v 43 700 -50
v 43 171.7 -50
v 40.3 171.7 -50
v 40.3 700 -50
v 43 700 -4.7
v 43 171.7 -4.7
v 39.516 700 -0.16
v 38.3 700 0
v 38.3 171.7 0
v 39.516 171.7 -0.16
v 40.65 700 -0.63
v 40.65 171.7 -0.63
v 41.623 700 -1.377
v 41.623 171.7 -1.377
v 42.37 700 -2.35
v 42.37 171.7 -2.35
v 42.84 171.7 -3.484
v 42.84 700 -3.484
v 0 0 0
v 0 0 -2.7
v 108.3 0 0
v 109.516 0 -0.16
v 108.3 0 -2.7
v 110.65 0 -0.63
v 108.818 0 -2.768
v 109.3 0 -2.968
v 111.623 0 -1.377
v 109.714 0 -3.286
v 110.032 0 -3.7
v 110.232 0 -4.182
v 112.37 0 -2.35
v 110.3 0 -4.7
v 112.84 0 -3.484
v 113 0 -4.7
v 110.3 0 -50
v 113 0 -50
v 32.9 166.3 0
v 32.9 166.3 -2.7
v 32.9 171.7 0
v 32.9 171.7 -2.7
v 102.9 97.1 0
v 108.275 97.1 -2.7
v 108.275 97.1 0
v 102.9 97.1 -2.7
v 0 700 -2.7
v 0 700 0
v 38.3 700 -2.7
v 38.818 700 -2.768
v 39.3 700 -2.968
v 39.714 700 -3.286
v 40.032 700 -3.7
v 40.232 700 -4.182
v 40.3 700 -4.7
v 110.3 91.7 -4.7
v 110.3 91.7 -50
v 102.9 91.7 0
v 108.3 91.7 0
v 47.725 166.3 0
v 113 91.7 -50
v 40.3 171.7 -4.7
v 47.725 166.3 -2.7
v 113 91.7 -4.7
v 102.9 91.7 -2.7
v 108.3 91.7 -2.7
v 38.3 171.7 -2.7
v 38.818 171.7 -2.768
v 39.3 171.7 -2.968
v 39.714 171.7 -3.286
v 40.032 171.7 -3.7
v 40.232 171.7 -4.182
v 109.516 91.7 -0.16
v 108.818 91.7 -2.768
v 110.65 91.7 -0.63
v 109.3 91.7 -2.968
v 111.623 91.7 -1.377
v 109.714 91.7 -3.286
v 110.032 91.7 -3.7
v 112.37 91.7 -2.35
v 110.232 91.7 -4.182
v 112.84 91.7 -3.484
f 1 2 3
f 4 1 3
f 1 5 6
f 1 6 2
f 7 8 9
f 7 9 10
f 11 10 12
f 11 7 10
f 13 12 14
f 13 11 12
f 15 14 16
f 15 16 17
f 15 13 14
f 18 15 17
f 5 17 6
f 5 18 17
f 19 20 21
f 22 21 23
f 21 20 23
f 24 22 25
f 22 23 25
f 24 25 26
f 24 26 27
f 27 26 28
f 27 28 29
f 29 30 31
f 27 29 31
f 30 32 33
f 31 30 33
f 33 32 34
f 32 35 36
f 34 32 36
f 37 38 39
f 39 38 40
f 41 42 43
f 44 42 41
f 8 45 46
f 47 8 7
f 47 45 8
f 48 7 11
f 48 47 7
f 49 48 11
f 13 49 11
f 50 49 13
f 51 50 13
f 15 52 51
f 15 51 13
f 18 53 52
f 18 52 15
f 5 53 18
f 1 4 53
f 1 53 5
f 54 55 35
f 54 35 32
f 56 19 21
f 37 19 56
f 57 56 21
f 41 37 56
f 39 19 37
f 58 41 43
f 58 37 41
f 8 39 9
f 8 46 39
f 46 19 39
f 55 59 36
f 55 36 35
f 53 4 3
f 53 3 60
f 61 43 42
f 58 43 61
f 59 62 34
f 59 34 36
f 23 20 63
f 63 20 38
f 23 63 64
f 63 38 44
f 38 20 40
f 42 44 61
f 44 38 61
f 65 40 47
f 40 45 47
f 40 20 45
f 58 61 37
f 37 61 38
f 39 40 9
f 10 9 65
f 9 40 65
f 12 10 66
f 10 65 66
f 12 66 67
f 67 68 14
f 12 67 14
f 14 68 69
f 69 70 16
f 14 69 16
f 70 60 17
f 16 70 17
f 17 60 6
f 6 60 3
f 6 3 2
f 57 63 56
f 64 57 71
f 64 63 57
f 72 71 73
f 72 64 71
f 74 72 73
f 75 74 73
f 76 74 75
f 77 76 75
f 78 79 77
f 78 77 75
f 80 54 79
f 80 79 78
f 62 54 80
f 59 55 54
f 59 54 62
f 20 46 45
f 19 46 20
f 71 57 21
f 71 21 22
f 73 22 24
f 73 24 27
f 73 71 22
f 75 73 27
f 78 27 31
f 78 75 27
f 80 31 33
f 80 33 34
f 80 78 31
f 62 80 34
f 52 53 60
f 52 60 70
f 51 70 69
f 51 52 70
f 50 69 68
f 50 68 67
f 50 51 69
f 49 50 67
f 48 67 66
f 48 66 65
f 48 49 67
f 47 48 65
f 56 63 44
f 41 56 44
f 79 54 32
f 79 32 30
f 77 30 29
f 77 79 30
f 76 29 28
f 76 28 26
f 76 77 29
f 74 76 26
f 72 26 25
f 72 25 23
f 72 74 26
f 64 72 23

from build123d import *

# Parameters (mm, degrees)
BASE_FLANGE1_DEPTH              = 2.7
EDGE_FLANGE1_STRIP_W            = 14.8
EDGE_FLANGE1_STRIP_H            = 2.7
EDGE_FLANGE1_STRIP_CUT_DEPTH    = 91.7
EDGE_FLANGE1_RELIEF_W           = 20.2
EDGE_FLANGE1_RELIEF_H           = 5.4
EDGE_FLANGE1_RELIEF_CUT_DEPTH   = 2.7
EDGE_FLANGE1_STRIP_2_W          = 14.8
EDGE_FLANGE1_STRIP_2_H          = 2.7
EDGE_FLANGE1_STRIP_CUT_2_DEPTH  = 528.3
EDGE_FLANGE1_RELIEF_2_W         = 20.2
EDGE_FLANGE1_RELIEF_2_H         = 5.4
EDGE_FLANGE1_RELIEF_CUT_2_DEPTH = 2.7
EDGE_FLANGE1_DEPTH              = 91.7
EDGE_FLANGE1_BEND_DEPTH         = 528.3


# Sheet-metal steps are written as plain solids
with BuildPart() as part:
    # Sketch1 → Base-Flange1 (new body)
    with BuildSketch(Plane.XY):
        Polygon((43, 700), (0, 700), (0, 0), (113, 0), (113, 91.7), (43, 171.7), align=None)
    extrude(amount=-BASE_FLANGE1_DEPTH)

    # Edge-Flange1 strip (across the edge) → Edge-Flange1 strip cut (cut)
    with BuildSketch(Plane(origin=(113, 91.7, -2.7), x_dir=(-1, 0, 0), z_dir=(0, -1, 0))):
        with Locations((-2.7, -1.35)):
            Rectangle(EDGE_FLANGE1_STRIP_W, EDGE_FLANGE1_STRIP_H)
    extrude(amount=EDGE_FLANGE1_STRIP_CUT_DEPTH, mode=Mode.SUBTRACT)

    # Edge-Flange1 relief (on the sheet) → Edge-Flange1 relief cut (cut)
    with BuildSketch(Plane(origin=(108.3, 91.7, -2.7), x_dir=(-1, 0, 0), z_dir=(0, 0, -1))):
        with Locations((-4.7, 2.7)):
            Rectangle(EDGE_FLANGE1_RELIEF_W, EDGE_FLANGE1_RELIEF_H)
    extrude(amount=-EDGE_FLANGE1_RELIEF_CUT_DEPTH, mode=Mode.SUBTRACT)

    # Edge-Flange1 strip 2 (across the edge) → Edge-Flange1 strip cut 2 (cut)
    with BuildSketch(Plane(origin=(43, 700, -2.7), x_dir=(-1, 0, 0), z_dir=(0, -1, 0))):
        with Locations((-2.7, -1.35)):
            Rectangle(EDGE_FLANGE1_STRIP_2_W, EDGE_FLANGE1_STRIP_2_H)
    extrude(amount=EDGE_FLANGE1_STRIP_CUT_2_DEPTH, mode=Mode.SUBTRACT)

    # Edge-Flange1 relief 2 (on the sheet) → Edge-Flange1 relief cut 2 (cut)
    with BuildSketch(Plane(origin=(38.3, 700, -2.7), x_dir=(-1, 0, 0), z_dir=(0, 0, -1))):
        with Locations((-4.7, -531)):
            Rectangle(EDGE_FLANGE1_RELIEF_2_W, EDGE_FLANGE1_RELIEF_2_H)
    extrude(amount=-EDGE_FLANGE1_RELIEF_CUT_2_DEPTH, mode=Mode.SUBTRACT)

    # Edge-Flange1 section (across the edge) → Edge-Flange1 (add)
    with BuildSketch(Plane(origin=(113, 91.7, -2.7), x_dir=(-1, 0, 0), z_dir=(0, -1, 0))):
        with BuildLine():
            Line((0, 2), (0, 47.3))
            Line((0, 47.3), (2.7, 47.3))
            Line((2.7, 47.3), (2.7, 2))
            ThreePointArc((2.7, 2), (3.285786438, 0.585786438), (4.7, 0))
            Line((4.7, 0), (4.7, -2.7))
            ThreePointArc((4.7, -2.7), (1.376598128, -1.323401872), (0, 2))
        make_face()
    extrude(amount=EDGE_FLANGE1_DEPTH)

    # Edge-Flange1 section 2 (across the edge) → Edge-Flange1 bend (add)
    with BuildSketch(Plane(origin=(43, 700, -2.7), x_dir=(-1, 0, 0), z_dir=(0, -1, 0))):
        with BuildLine():
            Line((0, 2), (0, 47.3))
            Line((0, 47.3), (2.7, 47.3))
            Line((2.7, 47.3), (2.7, 2))
            ThreePointArc((2.7, 2), (3.285786438, 0.585786438), (4.7, 0))
            Line((4.7, 0), (4.7, -2.7))
            ThreePointArc((4.7, -2.7), (1.376598128, -1.323401872), (0, 2))
        make_face()
    extrude(amount=EDGE_FLANGE1_BEND_DEPTH)


solid = part.part
